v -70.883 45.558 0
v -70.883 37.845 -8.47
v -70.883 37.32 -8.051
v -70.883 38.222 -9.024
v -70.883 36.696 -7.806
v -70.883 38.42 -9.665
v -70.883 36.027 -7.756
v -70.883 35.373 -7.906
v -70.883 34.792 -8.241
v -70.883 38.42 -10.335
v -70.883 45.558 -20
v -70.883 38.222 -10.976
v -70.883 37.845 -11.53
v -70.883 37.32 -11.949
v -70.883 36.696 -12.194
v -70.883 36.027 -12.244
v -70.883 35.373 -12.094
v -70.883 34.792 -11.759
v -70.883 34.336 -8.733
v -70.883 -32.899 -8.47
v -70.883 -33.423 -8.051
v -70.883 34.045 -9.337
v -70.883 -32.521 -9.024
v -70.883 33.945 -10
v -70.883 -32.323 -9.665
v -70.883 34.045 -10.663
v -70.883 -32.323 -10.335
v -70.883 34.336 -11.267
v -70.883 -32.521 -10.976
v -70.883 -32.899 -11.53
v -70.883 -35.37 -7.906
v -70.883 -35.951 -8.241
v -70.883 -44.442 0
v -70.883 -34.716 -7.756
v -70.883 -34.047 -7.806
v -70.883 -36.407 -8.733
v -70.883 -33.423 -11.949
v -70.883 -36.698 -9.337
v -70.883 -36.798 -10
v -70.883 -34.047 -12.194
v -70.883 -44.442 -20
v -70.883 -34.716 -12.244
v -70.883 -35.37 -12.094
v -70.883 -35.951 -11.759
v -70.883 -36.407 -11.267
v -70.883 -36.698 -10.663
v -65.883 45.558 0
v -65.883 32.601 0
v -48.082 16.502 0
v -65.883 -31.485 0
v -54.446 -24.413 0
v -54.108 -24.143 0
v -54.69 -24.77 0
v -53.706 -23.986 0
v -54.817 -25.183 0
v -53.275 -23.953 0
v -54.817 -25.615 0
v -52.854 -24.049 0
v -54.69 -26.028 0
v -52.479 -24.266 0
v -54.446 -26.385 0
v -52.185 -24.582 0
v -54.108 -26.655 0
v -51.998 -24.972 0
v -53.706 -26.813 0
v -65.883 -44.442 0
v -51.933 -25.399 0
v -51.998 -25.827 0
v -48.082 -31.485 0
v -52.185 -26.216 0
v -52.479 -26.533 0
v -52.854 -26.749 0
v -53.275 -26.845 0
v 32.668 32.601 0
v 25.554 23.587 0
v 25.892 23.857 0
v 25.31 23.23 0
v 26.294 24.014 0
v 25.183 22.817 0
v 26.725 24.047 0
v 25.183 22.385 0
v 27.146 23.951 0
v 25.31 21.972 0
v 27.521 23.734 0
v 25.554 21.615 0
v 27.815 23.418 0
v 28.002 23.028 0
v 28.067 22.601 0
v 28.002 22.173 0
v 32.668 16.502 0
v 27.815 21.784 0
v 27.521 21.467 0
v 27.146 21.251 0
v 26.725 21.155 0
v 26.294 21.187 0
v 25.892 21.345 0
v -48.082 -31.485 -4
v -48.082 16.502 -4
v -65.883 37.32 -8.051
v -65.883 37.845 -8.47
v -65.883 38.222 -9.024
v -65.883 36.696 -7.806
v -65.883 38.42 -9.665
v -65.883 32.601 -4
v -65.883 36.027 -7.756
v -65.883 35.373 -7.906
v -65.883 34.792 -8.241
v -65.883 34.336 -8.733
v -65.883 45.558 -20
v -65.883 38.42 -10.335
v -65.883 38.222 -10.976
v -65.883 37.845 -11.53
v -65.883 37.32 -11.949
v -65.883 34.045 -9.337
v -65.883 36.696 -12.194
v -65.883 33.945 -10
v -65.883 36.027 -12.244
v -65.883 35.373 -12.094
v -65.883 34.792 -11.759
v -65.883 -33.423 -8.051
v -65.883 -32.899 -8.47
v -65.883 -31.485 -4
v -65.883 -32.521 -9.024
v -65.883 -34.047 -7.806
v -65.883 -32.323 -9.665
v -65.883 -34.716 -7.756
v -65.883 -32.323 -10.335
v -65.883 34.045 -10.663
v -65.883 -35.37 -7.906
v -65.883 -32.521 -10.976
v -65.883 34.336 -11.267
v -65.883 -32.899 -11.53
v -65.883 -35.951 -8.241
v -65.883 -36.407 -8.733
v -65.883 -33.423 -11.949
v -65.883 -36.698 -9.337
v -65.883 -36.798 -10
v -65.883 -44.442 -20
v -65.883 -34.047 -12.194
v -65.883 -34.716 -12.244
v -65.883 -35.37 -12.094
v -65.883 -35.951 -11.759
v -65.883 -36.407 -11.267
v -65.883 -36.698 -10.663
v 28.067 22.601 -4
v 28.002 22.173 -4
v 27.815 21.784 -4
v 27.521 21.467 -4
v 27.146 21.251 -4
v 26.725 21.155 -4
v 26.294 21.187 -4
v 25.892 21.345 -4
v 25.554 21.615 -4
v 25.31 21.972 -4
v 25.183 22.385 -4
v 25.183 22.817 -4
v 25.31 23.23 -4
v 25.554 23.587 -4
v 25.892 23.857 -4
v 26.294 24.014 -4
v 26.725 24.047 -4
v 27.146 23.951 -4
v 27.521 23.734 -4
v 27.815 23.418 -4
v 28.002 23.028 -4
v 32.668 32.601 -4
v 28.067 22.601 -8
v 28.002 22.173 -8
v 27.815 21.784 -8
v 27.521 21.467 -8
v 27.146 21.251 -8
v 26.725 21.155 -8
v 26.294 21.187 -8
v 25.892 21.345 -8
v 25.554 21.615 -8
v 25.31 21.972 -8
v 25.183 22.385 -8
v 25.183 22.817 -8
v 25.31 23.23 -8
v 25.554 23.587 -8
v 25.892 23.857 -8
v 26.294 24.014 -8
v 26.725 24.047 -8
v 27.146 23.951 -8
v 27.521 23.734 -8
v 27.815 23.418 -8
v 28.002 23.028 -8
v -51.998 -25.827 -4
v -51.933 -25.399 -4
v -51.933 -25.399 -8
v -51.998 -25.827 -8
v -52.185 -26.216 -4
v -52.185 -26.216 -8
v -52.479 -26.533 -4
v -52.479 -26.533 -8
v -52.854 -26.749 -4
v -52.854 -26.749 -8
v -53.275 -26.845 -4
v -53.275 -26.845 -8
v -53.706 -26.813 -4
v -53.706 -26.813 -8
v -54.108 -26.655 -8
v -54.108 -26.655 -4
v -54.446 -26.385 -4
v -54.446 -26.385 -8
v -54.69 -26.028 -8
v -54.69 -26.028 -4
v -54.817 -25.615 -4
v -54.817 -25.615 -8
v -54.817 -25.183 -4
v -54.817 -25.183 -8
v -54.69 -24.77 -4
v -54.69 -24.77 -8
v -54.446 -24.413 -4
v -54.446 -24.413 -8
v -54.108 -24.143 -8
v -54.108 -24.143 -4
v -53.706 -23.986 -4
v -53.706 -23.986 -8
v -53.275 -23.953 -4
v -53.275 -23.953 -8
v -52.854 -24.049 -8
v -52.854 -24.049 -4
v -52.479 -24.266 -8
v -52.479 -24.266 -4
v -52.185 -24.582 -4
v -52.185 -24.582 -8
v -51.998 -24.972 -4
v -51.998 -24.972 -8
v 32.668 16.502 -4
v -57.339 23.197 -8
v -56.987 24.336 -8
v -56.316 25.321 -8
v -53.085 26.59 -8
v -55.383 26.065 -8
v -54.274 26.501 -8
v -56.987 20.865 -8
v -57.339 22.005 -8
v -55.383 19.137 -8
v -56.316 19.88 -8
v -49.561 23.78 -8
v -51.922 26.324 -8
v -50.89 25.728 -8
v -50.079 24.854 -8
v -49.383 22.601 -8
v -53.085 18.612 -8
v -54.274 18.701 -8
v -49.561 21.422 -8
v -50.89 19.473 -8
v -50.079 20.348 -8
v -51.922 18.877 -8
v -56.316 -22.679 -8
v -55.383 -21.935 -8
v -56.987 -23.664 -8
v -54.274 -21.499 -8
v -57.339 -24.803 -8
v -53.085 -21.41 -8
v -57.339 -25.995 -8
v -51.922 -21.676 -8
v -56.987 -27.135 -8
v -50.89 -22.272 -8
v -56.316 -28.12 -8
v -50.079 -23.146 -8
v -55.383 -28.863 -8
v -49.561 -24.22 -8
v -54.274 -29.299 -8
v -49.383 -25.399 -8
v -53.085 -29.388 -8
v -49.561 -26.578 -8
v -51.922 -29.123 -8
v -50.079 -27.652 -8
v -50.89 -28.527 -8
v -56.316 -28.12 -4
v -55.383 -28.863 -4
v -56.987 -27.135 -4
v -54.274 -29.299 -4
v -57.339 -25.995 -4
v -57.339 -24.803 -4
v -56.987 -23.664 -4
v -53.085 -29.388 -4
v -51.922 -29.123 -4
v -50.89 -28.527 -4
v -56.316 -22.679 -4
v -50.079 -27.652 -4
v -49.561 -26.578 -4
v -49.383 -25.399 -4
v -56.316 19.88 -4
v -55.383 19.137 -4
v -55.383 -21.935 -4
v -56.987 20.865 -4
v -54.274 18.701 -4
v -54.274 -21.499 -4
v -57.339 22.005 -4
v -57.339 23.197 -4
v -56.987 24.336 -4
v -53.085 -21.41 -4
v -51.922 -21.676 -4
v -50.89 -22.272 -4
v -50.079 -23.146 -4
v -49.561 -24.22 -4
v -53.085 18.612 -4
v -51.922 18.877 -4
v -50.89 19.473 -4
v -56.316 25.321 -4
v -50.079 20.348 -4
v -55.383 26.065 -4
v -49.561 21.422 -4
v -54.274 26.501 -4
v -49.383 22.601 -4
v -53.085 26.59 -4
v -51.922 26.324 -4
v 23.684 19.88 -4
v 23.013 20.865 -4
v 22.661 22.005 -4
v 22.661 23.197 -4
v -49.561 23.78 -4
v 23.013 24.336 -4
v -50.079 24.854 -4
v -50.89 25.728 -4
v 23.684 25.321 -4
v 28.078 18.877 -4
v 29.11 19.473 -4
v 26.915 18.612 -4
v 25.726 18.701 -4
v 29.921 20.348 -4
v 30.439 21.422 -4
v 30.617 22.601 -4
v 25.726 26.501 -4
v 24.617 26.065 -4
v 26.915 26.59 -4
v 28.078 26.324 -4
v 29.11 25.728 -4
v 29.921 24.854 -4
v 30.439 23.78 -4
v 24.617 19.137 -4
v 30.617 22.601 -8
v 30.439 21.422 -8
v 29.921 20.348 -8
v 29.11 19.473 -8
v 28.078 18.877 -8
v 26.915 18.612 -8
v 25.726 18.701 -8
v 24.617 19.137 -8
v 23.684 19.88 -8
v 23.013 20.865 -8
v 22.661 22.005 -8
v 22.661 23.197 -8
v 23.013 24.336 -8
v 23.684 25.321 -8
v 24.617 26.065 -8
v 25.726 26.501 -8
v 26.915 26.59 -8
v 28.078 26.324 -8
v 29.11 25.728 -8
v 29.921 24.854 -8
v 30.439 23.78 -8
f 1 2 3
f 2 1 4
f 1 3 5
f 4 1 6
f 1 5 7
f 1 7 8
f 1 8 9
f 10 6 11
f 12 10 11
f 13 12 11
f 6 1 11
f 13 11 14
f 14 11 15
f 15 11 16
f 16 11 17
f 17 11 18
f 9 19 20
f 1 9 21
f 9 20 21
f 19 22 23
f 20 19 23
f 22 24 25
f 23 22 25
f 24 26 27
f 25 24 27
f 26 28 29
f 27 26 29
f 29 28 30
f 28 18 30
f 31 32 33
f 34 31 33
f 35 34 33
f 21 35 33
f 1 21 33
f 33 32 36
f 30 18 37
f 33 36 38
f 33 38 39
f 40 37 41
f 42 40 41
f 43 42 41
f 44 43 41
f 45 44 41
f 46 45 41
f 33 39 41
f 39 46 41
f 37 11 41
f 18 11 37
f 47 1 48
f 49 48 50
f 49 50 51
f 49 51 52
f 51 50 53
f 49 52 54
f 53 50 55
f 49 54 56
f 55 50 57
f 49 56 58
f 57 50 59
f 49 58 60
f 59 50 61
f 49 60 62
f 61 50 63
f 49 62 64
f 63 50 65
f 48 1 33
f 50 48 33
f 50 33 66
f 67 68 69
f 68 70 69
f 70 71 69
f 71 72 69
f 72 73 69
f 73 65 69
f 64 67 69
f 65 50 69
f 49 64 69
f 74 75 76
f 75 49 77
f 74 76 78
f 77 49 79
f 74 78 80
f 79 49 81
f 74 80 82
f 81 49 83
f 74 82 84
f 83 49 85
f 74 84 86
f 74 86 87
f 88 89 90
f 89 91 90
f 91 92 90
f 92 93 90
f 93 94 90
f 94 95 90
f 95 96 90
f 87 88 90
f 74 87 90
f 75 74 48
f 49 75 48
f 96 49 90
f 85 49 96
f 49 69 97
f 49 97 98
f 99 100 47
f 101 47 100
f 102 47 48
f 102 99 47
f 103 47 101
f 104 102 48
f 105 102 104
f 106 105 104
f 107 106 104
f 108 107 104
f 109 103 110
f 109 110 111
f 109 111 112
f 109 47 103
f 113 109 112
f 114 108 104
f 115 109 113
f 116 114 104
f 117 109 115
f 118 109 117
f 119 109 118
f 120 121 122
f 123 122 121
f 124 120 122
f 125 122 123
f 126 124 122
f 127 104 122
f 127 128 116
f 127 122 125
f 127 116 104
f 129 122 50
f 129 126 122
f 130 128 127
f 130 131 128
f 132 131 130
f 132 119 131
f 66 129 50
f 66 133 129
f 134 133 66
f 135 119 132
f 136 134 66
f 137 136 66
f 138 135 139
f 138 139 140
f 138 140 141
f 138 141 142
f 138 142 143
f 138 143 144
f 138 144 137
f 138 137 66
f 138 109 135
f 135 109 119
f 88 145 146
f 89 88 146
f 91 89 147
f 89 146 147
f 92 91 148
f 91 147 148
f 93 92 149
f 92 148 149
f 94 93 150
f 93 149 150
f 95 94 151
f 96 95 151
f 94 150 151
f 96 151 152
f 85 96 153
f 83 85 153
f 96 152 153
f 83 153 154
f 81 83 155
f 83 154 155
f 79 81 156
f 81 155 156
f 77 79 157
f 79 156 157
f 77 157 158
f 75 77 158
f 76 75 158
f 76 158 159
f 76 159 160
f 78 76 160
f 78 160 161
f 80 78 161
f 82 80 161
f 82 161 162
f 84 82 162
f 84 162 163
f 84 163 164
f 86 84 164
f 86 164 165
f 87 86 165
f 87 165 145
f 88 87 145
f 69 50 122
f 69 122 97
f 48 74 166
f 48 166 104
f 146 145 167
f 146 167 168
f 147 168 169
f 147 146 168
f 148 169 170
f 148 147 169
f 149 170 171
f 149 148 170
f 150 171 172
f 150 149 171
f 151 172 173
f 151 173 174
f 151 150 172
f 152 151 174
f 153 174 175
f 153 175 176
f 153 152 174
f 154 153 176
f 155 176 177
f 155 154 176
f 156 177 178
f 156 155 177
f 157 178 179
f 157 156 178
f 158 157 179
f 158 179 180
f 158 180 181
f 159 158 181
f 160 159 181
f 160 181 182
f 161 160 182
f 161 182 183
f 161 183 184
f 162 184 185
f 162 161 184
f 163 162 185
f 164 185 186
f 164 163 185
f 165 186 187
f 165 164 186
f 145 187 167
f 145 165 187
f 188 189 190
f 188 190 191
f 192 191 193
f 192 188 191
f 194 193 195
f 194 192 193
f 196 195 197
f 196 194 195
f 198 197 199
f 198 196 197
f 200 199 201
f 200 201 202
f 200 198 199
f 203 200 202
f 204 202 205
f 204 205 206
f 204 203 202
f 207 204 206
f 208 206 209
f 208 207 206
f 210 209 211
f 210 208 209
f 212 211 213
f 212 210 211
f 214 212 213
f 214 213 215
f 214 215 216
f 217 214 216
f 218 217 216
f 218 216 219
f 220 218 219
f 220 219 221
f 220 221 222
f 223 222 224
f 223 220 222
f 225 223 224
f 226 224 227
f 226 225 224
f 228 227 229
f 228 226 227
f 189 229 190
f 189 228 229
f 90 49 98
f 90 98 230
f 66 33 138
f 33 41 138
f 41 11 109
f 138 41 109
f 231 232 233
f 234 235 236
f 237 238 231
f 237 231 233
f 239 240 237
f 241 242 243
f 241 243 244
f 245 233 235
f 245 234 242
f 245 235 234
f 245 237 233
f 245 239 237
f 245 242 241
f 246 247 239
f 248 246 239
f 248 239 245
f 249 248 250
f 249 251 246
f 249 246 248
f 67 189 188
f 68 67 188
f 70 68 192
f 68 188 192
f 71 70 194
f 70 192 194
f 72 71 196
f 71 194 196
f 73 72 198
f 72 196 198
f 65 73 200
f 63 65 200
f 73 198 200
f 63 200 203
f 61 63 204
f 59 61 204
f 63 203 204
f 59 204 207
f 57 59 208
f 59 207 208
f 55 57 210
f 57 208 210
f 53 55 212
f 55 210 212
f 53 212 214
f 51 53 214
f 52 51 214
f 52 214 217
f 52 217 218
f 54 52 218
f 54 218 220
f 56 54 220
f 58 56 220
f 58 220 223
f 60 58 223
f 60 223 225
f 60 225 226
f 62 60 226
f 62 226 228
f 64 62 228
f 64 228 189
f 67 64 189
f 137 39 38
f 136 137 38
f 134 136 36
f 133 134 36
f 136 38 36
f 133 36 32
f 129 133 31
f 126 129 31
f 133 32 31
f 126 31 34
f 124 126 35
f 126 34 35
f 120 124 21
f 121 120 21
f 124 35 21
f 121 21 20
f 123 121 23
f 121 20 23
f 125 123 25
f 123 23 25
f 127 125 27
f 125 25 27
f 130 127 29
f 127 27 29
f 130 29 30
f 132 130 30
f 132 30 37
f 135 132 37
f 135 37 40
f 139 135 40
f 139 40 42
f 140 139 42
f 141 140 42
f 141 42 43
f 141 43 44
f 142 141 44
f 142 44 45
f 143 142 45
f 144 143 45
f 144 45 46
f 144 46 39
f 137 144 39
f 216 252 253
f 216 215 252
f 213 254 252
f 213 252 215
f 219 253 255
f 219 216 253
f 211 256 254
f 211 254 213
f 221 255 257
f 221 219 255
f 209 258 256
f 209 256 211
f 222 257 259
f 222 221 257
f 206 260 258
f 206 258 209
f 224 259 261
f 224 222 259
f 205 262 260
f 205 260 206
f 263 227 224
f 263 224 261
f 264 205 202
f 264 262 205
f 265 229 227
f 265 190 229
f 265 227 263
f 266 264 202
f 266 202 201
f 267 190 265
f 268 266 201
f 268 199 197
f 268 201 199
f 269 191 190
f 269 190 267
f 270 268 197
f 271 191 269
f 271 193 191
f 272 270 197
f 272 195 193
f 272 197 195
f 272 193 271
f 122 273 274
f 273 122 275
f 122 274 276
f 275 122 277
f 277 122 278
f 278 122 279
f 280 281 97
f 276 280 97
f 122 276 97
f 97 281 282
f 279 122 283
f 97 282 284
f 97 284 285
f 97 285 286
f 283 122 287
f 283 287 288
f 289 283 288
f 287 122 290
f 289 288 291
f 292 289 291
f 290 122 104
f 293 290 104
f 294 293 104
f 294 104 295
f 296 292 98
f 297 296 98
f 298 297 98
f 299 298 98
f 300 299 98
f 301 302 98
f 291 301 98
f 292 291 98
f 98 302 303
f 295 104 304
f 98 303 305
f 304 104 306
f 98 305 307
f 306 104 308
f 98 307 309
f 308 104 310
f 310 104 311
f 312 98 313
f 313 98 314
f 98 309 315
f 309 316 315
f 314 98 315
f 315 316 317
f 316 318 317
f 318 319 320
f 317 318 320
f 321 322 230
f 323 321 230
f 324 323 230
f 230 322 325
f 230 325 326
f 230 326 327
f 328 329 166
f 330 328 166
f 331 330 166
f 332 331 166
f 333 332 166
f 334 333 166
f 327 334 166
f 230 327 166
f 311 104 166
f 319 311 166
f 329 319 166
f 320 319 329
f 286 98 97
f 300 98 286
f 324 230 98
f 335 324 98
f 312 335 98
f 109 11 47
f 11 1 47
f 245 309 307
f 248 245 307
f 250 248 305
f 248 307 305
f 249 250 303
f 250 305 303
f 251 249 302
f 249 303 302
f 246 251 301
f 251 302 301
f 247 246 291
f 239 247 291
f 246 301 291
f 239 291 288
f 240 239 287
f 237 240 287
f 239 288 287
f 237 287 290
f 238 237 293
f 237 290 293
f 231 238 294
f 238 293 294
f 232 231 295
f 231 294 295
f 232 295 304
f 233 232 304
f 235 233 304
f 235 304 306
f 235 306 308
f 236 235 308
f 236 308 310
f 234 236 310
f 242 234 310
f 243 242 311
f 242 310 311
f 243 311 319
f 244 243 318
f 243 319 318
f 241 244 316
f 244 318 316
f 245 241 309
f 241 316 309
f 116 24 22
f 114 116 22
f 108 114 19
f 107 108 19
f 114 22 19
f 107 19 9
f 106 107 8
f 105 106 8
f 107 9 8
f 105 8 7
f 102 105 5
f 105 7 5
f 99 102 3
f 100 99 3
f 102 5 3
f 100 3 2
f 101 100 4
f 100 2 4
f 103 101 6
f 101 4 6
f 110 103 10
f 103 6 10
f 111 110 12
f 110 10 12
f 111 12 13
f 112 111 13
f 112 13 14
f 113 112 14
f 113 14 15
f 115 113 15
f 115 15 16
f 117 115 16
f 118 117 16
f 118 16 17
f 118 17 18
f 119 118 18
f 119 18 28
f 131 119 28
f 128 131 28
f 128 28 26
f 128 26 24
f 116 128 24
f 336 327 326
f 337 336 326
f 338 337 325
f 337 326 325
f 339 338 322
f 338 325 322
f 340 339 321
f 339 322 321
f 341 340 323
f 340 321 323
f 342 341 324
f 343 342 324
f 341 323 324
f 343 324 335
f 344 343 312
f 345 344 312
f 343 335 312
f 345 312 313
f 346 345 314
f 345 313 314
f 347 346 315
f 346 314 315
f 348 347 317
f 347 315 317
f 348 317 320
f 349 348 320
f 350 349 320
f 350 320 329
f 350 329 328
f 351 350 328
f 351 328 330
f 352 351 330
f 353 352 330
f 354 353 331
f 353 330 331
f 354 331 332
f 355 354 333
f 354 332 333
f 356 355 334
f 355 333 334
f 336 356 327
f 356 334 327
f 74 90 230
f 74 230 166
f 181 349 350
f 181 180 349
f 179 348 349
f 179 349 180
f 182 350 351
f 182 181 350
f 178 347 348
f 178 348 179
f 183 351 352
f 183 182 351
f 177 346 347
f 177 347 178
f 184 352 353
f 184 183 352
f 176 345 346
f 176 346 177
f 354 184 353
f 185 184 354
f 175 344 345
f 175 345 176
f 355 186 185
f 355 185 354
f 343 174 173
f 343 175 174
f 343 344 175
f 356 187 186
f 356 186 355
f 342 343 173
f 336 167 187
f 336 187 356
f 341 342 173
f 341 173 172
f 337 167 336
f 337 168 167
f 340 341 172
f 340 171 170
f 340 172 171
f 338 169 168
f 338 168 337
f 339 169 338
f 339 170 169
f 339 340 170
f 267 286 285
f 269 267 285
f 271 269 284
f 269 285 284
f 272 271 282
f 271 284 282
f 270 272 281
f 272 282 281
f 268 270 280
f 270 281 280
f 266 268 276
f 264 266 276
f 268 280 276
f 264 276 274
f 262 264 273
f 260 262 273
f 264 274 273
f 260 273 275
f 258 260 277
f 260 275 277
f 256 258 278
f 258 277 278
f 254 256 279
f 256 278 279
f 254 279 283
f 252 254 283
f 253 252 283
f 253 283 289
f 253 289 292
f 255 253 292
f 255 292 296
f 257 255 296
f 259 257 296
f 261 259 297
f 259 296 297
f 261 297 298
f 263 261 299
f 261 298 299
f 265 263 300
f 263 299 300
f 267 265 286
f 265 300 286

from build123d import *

# Parameters (mm, degrees)
F1_DEPTH = 4
F2_R     = 4
F2_R_2   = 1.45
F3_DEPTH = 4
F2_W     = 5
F2_H     = 64.0853656404
F2_H_2   = 12.9573171798
F4_DEPTH = 16
F5_R     = 2.25
F6_DEPTH = 25
F7_DEPTH = 4
F8_DEPTH = 25


with BuildPart() as f1:
    # F0 (on Top) → F1 (new body)
    with BuildSketch(Plane.XY):
        Polygon((32.6684095042, 32.6008076754), (-70.8834637033, 32.6008076754), (-70.8834637033, -31.4845579651), (-48.0820438839, -31.4845579651), (-48.0820438839, 16.5019411054), (32.6684095042, 16.5019411054), align=None)
    extrude(amount=-F1_DEPTH)

    # F2 (on face) → F3 (join)
    with BuildSketch(Plane(origin=(0, 0, -4), x_dir=(1, 0, 0), z_dir=(0, 0, -1))):
        with Locations((-53.3834637033, 25.3991923246)):
            Circle(F2_R)
        with Locations((-53.3834637033, 25.3991923246)):
            Circle(F2_R_2, mode=Mode.SUBTRACT)
        with Locations((26.6165362967, -22.6008076754)):
            Circle(F2_R)
        with Locations((26.6165362967, -22.6008076754)):
            Circle(F2_R_2, mode=Mode.SUBTRACT)
        with Locations((-53.3834637033, -22.6008076754)):
            Circle(F2_R)
    extrude(amount=F3_DEPTH)

    # F2 (on face) → F4 (join)
    with BuildSketch(Plane(origin=(0, 0, -4), x_dir=(1, 0, 0), z_dir=(0, 0, -1))):
        with Locations((-68.3834637033, -0.5581248552)):
            Rectangle(F2_W, F2_H)
        with Locations((-68.3834637033, 37.963216555)):
            Rectangle(F2_W, F2_H_2)
        with Locations((-68.3834637033, -39.0794662653)):
            Rectangle(F2_W, F2_H_2)
    extrude(amount=F4_DEPTH)

    # F5 (on face) → F6 (cut)
    with BuildSketch(Plane(origin=(-70.8834637033, 0, 0), x_dir=(0, -1, 0), z_dir=(-1, 0, 0))):
        with Locations((-36.1952548007, -10)):
            Circle(F5_R)
        with Locations((34.5479122297, -10)):
            Circle(F5_R)
    extrude(amount=-F6_DEPTH, mode=Mode.SUBTRACT)

    # F2 (on face) → F7 (join)
    with BuildSketch(Plane(origin=(0, 0, -4), x_dir=(1, 0, 0), z_dir=(0, 0, -1))):
        with Locations((-68.3834637033, 37.963216555)):
            Rectangle(F2_W, F2_H_2)
        with Locations((-68.3834637033, -39.0794662653)):
            Rectangle(F2_W, F2_H_2)
    extrude(amount=-F7_DEPTH)

    # F2 (on face) → F8 (cut)
    with BuildSketch(Plane(origin=(0, 0, -4), x_dir=(1, 0, 0), z_dir=(0, 0, -1))):
        with Locations((-53.3834637033, 25.3991923246)):
            Circle(F2_R_2)
        with Locations((26.6165362967, -22.6008076754)):
            Circle(F2_R_2)
    extrude(amount=-F8_DEPTH, mode=Mode.SUBTRACT)


solid = f1.part
